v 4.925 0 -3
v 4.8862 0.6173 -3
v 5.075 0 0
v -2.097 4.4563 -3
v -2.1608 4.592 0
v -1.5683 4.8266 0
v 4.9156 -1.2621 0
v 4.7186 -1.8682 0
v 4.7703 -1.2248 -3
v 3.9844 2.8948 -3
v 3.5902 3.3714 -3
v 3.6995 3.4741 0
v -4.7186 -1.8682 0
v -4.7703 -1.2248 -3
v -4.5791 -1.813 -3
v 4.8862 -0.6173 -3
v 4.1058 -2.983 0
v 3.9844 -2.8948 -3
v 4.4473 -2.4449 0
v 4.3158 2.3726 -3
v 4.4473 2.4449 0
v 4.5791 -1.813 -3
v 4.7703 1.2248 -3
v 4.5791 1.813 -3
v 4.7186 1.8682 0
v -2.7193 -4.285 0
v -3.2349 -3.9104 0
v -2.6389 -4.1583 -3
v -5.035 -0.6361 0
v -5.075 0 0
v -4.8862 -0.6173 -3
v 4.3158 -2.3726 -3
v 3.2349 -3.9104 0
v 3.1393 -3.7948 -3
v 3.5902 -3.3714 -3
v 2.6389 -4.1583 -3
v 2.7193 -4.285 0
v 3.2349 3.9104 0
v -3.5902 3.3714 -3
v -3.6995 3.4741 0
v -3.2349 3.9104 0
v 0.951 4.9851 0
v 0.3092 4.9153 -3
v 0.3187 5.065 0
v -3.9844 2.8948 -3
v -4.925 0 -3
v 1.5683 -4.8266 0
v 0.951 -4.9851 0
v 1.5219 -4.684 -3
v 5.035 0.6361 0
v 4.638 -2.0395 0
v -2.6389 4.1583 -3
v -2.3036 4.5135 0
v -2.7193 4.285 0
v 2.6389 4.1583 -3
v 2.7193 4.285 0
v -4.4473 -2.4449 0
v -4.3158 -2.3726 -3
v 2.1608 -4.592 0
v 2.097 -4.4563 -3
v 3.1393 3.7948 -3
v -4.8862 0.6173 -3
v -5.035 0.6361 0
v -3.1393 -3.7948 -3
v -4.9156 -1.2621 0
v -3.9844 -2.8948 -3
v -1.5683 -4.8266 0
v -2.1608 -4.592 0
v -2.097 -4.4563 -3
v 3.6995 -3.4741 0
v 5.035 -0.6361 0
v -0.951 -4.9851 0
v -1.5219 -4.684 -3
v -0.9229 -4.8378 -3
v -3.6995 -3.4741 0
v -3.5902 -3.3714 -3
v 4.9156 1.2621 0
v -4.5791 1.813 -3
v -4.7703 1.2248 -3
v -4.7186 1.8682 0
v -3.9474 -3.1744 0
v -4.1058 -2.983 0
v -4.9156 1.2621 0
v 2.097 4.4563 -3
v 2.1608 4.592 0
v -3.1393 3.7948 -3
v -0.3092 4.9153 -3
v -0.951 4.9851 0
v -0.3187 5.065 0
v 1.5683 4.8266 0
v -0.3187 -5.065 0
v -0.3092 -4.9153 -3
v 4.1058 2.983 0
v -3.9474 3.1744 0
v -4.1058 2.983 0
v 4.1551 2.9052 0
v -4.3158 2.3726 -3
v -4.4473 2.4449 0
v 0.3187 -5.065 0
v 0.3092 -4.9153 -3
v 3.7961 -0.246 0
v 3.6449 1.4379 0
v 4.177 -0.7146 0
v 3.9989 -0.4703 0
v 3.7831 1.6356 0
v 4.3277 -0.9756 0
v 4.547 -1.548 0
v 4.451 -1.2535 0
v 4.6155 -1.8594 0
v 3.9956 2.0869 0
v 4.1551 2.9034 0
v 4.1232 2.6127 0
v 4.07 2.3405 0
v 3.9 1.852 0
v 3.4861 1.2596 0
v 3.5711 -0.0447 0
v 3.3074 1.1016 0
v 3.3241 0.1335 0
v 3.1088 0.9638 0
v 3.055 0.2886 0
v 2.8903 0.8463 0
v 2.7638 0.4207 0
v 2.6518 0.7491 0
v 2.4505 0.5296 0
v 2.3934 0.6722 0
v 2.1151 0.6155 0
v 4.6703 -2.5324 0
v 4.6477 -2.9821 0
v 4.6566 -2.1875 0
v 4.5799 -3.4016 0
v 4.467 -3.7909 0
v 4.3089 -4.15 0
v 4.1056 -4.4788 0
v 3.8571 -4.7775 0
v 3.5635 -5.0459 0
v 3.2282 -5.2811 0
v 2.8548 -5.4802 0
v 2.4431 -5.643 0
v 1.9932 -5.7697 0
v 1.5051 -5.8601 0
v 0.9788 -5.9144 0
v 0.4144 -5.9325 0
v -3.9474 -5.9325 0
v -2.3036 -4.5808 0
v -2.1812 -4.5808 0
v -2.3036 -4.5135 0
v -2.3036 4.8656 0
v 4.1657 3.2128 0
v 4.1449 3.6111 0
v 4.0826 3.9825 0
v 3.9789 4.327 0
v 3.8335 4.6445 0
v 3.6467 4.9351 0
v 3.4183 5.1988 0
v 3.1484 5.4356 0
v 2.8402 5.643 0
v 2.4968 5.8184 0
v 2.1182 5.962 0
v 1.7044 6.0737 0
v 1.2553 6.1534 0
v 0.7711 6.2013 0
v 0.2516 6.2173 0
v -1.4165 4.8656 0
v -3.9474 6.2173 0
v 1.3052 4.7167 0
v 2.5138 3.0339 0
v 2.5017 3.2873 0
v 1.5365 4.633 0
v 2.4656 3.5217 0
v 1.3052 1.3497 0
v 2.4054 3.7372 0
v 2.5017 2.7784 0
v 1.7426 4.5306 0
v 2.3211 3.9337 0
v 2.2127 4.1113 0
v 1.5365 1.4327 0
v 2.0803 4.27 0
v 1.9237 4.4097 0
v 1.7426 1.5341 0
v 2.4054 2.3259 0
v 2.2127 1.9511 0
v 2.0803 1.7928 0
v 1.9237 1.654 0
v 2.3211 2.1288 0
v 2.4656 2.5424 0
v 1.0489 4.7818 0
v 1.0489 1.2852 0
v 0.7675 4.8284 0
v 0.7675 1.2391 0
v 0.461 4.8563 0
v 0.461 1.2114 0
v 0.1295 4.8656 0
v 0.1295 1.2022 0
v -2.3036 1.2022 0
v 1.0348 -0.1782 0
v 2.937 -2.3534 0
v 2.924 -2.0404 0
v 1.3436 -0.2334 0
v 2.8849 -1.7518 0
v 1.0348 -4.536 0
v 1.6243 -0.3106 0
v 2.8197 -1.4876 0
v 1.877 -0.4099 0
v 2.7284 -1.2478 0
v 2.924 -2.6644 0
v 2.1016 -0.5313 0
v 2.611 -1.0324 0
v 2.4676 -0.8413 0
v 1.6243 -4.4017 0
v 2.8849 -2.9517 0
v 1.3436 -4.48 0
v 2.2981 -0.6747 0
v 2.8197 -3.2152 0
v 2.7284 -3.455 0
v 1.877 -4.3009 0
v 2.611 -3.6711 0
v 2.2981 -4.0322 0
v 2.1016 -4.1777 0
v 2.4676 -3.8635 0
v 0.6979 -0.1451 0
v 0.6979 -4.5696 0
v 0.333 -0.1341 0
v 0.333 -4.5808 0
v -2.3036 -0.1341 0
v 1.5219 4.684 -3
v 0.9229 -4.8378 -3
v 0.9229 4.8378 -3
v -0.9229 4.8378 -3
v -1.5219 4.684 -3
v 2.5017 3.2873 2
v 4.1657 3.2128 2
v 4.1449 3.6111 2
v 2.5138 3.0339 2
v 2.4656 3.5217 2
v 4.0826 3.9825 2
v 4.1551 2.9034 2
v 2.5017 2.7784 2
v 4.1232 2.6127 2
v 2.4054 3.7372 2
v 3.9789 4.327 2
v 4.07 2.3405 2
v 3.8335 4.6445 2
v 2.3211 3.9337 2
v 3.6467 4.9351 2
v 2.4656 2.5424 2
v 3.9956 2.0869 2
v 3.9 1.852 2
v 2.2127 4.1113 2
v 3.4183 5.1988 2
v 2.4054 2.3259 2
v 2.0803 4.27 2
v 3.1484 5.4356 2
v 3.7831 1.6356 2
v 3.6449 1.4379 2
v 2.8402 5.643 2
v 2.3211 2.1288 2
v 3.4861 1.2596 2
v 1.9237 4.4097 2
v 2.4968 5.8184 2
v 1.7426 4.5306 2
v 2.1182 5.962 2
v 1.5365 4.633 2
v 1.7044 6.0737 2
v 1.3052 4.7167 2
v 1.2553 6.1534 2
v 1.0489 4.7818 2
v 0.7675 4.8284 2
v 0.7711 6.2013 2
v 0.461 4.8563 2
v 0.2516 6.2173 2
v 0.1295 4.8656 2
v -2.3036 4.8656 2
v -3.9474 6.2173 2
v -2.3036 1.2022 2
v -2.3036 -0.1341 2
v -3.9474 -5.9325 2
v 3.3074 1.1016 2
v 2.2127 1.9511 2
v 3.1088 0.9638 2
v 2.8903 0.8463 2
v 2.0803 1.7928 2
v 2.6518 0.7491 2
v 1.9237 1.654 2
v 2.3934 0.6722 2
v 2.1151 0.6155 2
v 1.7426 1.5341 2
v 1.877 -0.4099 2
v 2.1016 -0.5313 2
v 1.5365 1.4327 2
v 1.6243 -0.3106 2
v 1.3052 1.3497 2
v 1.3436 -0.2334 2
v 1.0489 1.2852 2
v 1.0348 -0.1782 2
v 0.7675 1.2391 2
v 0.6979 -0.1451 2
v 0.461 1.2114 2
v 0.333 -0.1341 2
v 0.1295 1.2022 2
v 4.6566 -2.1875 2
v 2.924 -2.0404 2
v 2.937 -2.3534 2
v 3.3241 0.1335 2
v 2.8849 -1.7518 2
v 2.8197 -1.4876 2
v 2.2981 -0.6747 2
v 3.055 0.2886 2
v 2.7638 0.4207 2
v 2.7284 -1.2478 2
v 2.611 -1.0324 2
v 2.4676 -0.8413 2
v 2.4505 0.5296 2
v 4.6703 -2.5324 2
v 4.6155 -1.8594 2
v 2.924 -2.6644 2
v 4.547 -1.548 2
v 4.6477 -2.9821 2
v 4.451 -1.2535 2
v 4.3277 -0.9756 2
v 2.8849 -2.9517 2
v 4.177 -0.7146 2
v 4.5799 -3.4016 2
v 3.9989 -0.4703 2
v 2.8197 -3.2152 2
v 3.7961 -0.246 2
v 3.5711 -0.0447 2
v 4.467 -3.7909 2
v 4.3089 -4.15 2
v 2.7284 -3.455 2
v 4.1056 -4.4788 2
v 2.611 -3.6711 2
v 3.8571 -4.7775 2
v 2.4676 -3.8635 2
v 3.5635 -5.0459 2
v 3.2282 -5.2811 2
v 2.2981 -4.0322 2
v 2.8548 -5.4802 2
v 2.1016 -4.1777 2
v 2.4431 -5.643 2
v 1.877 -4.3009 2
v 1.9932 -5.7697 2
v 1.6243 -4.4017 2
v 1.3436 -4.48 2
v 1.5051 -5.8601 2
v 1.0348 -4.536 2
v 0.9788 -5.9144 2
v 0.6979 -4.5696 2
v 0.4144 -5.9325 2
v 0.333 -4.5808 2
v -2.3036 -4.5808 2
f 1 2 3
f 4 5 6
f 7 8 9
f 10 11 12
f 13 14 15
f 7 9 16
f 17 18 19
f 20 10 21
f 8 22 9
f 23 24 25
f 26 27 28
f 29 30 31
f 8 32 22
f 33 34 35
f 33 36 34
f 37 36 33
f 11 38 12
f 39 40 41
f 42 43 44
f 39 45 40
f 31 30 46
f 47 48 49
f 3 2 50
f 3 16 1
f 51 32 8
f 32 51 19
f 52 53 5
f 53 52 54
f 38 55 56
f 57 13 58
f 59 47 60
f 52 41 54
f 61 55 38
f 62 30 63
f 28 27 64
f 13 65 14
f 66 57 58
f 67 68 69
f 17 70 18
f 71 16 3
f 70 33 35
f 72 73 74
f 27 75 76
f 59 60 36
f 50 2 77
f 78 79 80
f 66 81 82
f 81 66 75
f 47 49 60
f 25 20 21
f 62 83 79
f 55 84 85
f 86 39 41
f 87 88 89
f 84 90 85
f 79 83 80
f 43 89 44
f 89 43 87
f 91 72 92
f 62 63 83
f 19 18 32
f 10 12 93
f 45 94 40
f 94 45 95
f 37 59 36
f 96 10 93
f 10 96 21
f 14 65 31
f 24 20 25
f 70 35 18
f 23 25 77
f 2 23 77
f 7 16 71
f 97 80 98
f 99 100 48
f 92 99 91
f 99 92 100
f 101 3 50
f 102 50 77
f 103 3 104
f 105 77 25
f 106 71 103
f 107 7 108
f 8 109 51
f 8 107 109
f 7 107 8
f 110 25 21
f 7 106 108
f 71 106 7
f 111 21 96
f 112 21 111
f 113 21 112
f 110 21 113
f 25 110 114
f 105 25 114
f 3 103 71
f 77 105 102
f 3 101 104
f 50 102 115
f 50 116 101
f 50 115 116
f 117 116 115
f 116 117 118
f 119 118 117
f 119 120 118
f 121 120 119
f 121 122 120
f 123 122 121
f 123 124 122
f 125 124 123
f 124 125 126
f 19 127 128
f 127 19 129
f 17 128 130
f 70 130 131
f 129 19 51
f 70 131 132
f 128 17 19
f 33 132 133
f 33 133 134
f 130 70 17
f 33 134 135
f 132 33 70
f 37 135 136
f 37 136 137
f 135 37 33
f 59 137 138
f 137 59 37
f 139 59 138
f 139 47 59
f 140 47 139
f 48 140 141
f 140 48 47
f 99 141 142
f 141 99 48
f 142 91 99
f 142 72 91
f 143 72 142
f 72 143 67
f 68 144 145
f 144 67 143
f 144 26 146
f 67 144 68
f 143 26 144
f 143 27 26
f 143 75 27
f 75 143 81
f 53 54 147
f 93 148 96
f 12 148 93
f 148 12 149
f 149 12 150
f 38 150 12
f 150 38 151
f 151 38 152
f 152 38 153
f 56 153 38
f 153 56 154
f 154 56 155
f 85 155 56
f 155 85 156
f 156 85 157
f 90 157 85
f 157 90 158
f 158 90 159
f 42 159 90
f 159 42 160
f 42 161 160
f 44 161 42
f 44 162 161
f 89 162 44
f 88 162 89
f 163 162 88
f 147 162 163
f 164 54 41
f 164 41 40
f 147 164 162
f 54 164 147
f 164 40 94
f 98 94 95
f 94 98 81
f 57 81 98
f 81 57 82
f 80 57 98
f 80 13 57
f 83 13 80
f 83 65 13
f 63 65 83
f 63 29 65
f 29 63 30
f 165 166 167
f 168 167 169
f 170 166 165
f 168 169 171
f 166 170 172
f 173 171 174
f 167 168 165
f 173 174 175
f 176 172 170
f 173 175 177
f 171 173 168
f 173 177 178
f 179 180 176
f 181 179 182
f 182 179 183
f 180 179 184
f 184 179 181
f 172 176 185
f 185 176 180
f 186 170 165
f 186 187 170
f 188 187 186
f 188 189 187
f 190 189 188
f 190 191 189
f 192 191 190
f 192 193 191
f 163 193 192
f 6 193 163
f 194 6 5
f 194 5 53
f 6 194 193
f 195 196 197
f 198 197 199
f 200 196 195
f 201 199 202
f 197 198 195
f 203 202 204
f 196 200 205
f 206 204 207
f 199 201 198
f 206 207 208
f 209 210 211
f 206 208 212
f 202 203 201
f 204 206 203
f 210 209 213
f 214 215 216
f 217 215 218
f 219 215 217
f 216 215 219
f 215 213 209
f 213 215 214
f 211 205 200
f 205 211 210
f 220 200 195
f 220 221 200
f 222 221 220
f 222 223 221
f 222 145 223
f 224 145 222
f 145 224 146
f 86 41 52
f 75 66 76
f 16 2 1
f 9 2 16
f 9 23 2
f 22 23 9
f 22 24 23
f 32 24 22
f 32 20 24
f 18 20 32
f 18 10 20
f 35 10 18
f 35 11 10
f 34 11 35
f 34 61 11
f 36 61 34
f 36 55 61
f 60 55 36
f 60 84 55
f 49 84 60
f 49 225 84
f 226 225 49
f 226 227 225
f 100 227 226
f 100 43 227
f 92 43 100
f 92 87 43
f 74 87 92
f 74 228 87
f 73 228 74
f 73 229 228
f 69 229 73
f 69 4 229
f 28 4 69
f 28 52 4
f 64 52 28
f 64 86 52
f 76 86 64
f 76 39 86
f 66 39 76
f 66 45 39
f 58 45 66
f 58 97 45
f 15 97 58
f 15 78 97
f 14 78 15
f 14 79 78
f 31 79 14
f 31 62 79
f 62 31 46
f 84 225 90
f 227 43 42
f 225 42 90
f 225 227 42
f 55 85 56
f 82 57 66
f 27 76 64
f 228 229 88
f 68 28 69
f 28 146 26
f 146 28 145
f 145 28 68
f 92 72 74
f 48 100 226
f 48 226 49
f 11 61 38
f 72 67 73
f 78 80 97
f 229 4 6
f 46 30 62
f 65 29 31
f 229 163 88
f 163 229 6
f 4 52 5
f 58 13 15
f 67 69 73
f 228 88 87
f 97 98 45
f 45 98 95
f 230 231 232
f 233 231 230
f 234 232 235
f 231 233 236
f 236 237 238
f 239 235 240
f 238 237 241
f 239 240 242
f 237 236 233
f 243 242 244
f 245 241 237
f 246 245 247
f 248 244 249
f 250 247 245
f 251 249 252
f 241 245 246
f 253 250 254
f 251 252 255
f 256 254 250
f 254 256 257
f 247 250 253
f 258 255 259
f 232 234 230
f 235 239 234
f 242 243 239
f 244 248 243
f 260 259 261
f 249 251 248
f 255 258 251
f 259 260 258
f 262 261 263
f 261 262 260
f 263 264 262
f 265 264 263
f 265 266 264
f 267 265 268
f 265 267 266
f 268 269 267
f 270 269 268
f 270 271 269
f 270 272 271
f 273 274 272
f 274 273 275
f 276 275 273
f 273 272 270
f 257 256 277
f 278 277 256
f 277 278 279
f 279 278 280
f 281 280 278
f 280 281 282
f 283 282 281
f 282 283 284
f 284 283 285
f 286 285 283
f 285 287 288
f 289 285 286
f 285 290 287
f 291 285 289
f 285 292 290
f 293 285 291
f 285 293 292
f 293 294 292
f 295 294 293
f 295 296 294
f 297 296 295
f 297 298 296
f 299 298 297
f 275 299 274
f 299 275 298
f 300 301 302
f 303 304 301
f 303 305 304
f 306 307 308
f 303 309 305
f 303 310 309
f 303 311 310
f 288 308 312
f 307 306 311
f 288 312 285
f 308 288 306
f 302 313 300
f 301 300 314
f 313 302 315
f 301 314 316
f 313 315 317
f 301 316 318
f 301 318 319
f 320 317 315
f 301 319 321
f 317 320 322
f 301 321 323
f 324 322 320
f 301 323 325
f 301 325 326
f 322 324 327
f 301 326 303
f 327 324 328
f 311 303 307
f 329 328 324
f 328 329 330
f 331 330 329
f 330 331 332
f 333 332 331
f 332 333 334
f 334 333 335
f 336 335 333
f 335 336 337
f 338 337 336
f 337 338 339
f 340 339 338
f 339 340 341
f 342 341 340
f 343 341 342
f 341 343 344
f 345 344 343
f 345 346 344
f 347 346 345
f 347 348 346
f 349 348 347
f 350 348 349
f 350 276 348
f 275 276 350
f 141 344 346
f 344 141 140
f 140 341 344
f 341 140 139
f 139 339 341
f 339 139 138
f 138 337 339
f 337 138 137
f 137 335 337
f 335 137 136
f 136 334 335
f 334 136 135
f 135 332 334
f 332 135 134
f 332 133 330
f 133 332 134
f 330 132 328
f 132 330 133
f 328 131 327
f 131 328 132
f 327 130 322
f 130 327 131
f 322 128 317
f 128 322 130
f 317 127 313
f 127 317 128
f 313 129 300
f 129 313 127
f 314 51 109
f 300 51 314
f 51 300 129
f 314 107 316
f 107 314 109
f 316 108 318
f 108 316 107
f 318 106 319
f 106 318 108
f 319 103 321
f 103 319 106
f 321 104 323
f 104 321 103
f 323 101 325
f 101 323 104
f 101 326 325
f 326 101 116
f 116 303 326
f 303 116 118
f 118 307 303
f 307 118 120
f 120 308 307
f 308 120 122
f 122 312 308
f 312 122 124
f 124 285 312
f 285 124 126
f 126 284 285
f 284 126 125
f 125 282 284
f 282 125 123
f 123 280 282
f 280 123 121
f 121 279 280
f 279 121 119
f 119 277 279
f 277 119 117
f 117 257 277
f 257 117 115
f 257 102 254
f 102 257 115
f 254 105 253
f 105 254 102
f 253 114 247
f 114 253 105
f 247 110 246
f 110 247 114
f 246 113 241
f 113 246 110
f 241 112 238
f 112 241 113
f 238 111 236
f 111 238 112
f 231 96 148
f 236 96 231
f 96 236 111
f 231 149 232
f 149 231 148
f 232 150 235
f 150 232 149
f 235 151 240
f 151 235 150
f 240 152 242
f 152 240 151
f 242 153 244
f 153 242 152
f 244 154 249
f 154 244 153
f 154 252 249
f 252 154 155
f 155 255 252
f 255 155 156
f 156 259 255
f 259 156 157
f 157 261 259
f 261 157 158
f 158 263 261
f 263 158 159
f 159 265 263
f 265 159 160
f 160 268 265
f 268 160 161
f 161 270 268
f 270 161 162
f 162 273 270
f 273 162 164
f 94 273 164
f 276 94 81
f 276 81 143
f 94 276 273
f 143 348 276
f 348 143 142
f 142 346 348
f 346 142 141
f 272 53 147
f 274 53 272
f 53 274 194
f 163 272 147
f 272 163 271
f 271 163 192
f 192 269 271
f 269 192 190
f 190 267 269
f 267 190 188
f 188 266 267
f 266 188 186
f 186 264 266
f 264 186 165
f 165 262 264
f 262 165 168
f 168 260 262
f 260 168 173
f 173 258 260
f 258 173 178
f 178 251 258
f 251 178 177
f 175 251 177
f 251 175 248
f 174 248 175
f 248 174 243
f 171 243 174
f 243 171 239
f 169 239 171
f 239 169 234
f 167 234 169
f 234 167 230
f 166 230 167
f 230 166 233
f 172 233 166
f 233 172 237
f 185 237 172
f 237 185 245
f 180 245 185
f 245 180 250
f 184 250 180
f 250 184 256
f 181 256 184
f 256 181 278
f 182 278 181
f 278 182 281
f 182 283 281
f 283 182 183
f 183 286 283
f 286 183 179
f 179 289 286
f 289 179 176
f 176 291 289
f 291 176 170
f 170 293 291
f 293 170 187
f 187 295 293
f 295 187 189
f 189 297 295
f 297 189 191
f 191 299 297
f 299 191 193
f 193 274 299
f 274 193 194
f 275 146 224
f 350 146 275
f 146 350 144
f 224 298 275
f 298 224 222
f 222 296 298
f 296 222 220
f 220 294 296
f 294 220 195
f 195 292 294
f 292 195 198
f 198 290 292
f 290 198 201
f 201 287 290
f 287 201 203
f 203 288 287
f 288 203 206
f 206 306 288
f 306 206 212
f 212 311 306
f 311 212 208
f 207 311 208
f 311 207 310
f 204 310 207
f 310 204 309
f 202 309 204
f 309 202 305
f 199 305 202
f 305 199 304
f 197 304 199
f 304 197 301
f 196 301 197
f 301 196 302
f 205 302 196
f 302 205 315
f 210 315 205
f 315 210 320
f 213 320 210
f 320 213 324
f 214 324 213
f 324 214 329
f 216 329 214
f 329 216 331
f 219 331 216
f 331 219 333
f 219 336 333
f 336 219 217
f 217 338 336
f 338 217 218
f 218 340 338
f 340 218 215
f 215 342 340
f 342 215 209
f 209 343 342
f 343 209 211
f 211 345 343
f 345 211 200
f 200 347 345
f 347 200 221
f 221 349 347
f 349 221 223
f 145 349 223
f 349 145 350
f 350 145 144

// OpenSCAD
$fn = 50;

difference() {
	union() {
		translate(v = [0, 0, -3.0]) {
			cylinder(h = 3, r1 = 4.925, r2 = 5.075);
		}
		linear_extrude(height = 2) {
			text(font = "Impact", halign = "center", size = 12, text = "B", valign = "center");
		}
	}
	union();
}
